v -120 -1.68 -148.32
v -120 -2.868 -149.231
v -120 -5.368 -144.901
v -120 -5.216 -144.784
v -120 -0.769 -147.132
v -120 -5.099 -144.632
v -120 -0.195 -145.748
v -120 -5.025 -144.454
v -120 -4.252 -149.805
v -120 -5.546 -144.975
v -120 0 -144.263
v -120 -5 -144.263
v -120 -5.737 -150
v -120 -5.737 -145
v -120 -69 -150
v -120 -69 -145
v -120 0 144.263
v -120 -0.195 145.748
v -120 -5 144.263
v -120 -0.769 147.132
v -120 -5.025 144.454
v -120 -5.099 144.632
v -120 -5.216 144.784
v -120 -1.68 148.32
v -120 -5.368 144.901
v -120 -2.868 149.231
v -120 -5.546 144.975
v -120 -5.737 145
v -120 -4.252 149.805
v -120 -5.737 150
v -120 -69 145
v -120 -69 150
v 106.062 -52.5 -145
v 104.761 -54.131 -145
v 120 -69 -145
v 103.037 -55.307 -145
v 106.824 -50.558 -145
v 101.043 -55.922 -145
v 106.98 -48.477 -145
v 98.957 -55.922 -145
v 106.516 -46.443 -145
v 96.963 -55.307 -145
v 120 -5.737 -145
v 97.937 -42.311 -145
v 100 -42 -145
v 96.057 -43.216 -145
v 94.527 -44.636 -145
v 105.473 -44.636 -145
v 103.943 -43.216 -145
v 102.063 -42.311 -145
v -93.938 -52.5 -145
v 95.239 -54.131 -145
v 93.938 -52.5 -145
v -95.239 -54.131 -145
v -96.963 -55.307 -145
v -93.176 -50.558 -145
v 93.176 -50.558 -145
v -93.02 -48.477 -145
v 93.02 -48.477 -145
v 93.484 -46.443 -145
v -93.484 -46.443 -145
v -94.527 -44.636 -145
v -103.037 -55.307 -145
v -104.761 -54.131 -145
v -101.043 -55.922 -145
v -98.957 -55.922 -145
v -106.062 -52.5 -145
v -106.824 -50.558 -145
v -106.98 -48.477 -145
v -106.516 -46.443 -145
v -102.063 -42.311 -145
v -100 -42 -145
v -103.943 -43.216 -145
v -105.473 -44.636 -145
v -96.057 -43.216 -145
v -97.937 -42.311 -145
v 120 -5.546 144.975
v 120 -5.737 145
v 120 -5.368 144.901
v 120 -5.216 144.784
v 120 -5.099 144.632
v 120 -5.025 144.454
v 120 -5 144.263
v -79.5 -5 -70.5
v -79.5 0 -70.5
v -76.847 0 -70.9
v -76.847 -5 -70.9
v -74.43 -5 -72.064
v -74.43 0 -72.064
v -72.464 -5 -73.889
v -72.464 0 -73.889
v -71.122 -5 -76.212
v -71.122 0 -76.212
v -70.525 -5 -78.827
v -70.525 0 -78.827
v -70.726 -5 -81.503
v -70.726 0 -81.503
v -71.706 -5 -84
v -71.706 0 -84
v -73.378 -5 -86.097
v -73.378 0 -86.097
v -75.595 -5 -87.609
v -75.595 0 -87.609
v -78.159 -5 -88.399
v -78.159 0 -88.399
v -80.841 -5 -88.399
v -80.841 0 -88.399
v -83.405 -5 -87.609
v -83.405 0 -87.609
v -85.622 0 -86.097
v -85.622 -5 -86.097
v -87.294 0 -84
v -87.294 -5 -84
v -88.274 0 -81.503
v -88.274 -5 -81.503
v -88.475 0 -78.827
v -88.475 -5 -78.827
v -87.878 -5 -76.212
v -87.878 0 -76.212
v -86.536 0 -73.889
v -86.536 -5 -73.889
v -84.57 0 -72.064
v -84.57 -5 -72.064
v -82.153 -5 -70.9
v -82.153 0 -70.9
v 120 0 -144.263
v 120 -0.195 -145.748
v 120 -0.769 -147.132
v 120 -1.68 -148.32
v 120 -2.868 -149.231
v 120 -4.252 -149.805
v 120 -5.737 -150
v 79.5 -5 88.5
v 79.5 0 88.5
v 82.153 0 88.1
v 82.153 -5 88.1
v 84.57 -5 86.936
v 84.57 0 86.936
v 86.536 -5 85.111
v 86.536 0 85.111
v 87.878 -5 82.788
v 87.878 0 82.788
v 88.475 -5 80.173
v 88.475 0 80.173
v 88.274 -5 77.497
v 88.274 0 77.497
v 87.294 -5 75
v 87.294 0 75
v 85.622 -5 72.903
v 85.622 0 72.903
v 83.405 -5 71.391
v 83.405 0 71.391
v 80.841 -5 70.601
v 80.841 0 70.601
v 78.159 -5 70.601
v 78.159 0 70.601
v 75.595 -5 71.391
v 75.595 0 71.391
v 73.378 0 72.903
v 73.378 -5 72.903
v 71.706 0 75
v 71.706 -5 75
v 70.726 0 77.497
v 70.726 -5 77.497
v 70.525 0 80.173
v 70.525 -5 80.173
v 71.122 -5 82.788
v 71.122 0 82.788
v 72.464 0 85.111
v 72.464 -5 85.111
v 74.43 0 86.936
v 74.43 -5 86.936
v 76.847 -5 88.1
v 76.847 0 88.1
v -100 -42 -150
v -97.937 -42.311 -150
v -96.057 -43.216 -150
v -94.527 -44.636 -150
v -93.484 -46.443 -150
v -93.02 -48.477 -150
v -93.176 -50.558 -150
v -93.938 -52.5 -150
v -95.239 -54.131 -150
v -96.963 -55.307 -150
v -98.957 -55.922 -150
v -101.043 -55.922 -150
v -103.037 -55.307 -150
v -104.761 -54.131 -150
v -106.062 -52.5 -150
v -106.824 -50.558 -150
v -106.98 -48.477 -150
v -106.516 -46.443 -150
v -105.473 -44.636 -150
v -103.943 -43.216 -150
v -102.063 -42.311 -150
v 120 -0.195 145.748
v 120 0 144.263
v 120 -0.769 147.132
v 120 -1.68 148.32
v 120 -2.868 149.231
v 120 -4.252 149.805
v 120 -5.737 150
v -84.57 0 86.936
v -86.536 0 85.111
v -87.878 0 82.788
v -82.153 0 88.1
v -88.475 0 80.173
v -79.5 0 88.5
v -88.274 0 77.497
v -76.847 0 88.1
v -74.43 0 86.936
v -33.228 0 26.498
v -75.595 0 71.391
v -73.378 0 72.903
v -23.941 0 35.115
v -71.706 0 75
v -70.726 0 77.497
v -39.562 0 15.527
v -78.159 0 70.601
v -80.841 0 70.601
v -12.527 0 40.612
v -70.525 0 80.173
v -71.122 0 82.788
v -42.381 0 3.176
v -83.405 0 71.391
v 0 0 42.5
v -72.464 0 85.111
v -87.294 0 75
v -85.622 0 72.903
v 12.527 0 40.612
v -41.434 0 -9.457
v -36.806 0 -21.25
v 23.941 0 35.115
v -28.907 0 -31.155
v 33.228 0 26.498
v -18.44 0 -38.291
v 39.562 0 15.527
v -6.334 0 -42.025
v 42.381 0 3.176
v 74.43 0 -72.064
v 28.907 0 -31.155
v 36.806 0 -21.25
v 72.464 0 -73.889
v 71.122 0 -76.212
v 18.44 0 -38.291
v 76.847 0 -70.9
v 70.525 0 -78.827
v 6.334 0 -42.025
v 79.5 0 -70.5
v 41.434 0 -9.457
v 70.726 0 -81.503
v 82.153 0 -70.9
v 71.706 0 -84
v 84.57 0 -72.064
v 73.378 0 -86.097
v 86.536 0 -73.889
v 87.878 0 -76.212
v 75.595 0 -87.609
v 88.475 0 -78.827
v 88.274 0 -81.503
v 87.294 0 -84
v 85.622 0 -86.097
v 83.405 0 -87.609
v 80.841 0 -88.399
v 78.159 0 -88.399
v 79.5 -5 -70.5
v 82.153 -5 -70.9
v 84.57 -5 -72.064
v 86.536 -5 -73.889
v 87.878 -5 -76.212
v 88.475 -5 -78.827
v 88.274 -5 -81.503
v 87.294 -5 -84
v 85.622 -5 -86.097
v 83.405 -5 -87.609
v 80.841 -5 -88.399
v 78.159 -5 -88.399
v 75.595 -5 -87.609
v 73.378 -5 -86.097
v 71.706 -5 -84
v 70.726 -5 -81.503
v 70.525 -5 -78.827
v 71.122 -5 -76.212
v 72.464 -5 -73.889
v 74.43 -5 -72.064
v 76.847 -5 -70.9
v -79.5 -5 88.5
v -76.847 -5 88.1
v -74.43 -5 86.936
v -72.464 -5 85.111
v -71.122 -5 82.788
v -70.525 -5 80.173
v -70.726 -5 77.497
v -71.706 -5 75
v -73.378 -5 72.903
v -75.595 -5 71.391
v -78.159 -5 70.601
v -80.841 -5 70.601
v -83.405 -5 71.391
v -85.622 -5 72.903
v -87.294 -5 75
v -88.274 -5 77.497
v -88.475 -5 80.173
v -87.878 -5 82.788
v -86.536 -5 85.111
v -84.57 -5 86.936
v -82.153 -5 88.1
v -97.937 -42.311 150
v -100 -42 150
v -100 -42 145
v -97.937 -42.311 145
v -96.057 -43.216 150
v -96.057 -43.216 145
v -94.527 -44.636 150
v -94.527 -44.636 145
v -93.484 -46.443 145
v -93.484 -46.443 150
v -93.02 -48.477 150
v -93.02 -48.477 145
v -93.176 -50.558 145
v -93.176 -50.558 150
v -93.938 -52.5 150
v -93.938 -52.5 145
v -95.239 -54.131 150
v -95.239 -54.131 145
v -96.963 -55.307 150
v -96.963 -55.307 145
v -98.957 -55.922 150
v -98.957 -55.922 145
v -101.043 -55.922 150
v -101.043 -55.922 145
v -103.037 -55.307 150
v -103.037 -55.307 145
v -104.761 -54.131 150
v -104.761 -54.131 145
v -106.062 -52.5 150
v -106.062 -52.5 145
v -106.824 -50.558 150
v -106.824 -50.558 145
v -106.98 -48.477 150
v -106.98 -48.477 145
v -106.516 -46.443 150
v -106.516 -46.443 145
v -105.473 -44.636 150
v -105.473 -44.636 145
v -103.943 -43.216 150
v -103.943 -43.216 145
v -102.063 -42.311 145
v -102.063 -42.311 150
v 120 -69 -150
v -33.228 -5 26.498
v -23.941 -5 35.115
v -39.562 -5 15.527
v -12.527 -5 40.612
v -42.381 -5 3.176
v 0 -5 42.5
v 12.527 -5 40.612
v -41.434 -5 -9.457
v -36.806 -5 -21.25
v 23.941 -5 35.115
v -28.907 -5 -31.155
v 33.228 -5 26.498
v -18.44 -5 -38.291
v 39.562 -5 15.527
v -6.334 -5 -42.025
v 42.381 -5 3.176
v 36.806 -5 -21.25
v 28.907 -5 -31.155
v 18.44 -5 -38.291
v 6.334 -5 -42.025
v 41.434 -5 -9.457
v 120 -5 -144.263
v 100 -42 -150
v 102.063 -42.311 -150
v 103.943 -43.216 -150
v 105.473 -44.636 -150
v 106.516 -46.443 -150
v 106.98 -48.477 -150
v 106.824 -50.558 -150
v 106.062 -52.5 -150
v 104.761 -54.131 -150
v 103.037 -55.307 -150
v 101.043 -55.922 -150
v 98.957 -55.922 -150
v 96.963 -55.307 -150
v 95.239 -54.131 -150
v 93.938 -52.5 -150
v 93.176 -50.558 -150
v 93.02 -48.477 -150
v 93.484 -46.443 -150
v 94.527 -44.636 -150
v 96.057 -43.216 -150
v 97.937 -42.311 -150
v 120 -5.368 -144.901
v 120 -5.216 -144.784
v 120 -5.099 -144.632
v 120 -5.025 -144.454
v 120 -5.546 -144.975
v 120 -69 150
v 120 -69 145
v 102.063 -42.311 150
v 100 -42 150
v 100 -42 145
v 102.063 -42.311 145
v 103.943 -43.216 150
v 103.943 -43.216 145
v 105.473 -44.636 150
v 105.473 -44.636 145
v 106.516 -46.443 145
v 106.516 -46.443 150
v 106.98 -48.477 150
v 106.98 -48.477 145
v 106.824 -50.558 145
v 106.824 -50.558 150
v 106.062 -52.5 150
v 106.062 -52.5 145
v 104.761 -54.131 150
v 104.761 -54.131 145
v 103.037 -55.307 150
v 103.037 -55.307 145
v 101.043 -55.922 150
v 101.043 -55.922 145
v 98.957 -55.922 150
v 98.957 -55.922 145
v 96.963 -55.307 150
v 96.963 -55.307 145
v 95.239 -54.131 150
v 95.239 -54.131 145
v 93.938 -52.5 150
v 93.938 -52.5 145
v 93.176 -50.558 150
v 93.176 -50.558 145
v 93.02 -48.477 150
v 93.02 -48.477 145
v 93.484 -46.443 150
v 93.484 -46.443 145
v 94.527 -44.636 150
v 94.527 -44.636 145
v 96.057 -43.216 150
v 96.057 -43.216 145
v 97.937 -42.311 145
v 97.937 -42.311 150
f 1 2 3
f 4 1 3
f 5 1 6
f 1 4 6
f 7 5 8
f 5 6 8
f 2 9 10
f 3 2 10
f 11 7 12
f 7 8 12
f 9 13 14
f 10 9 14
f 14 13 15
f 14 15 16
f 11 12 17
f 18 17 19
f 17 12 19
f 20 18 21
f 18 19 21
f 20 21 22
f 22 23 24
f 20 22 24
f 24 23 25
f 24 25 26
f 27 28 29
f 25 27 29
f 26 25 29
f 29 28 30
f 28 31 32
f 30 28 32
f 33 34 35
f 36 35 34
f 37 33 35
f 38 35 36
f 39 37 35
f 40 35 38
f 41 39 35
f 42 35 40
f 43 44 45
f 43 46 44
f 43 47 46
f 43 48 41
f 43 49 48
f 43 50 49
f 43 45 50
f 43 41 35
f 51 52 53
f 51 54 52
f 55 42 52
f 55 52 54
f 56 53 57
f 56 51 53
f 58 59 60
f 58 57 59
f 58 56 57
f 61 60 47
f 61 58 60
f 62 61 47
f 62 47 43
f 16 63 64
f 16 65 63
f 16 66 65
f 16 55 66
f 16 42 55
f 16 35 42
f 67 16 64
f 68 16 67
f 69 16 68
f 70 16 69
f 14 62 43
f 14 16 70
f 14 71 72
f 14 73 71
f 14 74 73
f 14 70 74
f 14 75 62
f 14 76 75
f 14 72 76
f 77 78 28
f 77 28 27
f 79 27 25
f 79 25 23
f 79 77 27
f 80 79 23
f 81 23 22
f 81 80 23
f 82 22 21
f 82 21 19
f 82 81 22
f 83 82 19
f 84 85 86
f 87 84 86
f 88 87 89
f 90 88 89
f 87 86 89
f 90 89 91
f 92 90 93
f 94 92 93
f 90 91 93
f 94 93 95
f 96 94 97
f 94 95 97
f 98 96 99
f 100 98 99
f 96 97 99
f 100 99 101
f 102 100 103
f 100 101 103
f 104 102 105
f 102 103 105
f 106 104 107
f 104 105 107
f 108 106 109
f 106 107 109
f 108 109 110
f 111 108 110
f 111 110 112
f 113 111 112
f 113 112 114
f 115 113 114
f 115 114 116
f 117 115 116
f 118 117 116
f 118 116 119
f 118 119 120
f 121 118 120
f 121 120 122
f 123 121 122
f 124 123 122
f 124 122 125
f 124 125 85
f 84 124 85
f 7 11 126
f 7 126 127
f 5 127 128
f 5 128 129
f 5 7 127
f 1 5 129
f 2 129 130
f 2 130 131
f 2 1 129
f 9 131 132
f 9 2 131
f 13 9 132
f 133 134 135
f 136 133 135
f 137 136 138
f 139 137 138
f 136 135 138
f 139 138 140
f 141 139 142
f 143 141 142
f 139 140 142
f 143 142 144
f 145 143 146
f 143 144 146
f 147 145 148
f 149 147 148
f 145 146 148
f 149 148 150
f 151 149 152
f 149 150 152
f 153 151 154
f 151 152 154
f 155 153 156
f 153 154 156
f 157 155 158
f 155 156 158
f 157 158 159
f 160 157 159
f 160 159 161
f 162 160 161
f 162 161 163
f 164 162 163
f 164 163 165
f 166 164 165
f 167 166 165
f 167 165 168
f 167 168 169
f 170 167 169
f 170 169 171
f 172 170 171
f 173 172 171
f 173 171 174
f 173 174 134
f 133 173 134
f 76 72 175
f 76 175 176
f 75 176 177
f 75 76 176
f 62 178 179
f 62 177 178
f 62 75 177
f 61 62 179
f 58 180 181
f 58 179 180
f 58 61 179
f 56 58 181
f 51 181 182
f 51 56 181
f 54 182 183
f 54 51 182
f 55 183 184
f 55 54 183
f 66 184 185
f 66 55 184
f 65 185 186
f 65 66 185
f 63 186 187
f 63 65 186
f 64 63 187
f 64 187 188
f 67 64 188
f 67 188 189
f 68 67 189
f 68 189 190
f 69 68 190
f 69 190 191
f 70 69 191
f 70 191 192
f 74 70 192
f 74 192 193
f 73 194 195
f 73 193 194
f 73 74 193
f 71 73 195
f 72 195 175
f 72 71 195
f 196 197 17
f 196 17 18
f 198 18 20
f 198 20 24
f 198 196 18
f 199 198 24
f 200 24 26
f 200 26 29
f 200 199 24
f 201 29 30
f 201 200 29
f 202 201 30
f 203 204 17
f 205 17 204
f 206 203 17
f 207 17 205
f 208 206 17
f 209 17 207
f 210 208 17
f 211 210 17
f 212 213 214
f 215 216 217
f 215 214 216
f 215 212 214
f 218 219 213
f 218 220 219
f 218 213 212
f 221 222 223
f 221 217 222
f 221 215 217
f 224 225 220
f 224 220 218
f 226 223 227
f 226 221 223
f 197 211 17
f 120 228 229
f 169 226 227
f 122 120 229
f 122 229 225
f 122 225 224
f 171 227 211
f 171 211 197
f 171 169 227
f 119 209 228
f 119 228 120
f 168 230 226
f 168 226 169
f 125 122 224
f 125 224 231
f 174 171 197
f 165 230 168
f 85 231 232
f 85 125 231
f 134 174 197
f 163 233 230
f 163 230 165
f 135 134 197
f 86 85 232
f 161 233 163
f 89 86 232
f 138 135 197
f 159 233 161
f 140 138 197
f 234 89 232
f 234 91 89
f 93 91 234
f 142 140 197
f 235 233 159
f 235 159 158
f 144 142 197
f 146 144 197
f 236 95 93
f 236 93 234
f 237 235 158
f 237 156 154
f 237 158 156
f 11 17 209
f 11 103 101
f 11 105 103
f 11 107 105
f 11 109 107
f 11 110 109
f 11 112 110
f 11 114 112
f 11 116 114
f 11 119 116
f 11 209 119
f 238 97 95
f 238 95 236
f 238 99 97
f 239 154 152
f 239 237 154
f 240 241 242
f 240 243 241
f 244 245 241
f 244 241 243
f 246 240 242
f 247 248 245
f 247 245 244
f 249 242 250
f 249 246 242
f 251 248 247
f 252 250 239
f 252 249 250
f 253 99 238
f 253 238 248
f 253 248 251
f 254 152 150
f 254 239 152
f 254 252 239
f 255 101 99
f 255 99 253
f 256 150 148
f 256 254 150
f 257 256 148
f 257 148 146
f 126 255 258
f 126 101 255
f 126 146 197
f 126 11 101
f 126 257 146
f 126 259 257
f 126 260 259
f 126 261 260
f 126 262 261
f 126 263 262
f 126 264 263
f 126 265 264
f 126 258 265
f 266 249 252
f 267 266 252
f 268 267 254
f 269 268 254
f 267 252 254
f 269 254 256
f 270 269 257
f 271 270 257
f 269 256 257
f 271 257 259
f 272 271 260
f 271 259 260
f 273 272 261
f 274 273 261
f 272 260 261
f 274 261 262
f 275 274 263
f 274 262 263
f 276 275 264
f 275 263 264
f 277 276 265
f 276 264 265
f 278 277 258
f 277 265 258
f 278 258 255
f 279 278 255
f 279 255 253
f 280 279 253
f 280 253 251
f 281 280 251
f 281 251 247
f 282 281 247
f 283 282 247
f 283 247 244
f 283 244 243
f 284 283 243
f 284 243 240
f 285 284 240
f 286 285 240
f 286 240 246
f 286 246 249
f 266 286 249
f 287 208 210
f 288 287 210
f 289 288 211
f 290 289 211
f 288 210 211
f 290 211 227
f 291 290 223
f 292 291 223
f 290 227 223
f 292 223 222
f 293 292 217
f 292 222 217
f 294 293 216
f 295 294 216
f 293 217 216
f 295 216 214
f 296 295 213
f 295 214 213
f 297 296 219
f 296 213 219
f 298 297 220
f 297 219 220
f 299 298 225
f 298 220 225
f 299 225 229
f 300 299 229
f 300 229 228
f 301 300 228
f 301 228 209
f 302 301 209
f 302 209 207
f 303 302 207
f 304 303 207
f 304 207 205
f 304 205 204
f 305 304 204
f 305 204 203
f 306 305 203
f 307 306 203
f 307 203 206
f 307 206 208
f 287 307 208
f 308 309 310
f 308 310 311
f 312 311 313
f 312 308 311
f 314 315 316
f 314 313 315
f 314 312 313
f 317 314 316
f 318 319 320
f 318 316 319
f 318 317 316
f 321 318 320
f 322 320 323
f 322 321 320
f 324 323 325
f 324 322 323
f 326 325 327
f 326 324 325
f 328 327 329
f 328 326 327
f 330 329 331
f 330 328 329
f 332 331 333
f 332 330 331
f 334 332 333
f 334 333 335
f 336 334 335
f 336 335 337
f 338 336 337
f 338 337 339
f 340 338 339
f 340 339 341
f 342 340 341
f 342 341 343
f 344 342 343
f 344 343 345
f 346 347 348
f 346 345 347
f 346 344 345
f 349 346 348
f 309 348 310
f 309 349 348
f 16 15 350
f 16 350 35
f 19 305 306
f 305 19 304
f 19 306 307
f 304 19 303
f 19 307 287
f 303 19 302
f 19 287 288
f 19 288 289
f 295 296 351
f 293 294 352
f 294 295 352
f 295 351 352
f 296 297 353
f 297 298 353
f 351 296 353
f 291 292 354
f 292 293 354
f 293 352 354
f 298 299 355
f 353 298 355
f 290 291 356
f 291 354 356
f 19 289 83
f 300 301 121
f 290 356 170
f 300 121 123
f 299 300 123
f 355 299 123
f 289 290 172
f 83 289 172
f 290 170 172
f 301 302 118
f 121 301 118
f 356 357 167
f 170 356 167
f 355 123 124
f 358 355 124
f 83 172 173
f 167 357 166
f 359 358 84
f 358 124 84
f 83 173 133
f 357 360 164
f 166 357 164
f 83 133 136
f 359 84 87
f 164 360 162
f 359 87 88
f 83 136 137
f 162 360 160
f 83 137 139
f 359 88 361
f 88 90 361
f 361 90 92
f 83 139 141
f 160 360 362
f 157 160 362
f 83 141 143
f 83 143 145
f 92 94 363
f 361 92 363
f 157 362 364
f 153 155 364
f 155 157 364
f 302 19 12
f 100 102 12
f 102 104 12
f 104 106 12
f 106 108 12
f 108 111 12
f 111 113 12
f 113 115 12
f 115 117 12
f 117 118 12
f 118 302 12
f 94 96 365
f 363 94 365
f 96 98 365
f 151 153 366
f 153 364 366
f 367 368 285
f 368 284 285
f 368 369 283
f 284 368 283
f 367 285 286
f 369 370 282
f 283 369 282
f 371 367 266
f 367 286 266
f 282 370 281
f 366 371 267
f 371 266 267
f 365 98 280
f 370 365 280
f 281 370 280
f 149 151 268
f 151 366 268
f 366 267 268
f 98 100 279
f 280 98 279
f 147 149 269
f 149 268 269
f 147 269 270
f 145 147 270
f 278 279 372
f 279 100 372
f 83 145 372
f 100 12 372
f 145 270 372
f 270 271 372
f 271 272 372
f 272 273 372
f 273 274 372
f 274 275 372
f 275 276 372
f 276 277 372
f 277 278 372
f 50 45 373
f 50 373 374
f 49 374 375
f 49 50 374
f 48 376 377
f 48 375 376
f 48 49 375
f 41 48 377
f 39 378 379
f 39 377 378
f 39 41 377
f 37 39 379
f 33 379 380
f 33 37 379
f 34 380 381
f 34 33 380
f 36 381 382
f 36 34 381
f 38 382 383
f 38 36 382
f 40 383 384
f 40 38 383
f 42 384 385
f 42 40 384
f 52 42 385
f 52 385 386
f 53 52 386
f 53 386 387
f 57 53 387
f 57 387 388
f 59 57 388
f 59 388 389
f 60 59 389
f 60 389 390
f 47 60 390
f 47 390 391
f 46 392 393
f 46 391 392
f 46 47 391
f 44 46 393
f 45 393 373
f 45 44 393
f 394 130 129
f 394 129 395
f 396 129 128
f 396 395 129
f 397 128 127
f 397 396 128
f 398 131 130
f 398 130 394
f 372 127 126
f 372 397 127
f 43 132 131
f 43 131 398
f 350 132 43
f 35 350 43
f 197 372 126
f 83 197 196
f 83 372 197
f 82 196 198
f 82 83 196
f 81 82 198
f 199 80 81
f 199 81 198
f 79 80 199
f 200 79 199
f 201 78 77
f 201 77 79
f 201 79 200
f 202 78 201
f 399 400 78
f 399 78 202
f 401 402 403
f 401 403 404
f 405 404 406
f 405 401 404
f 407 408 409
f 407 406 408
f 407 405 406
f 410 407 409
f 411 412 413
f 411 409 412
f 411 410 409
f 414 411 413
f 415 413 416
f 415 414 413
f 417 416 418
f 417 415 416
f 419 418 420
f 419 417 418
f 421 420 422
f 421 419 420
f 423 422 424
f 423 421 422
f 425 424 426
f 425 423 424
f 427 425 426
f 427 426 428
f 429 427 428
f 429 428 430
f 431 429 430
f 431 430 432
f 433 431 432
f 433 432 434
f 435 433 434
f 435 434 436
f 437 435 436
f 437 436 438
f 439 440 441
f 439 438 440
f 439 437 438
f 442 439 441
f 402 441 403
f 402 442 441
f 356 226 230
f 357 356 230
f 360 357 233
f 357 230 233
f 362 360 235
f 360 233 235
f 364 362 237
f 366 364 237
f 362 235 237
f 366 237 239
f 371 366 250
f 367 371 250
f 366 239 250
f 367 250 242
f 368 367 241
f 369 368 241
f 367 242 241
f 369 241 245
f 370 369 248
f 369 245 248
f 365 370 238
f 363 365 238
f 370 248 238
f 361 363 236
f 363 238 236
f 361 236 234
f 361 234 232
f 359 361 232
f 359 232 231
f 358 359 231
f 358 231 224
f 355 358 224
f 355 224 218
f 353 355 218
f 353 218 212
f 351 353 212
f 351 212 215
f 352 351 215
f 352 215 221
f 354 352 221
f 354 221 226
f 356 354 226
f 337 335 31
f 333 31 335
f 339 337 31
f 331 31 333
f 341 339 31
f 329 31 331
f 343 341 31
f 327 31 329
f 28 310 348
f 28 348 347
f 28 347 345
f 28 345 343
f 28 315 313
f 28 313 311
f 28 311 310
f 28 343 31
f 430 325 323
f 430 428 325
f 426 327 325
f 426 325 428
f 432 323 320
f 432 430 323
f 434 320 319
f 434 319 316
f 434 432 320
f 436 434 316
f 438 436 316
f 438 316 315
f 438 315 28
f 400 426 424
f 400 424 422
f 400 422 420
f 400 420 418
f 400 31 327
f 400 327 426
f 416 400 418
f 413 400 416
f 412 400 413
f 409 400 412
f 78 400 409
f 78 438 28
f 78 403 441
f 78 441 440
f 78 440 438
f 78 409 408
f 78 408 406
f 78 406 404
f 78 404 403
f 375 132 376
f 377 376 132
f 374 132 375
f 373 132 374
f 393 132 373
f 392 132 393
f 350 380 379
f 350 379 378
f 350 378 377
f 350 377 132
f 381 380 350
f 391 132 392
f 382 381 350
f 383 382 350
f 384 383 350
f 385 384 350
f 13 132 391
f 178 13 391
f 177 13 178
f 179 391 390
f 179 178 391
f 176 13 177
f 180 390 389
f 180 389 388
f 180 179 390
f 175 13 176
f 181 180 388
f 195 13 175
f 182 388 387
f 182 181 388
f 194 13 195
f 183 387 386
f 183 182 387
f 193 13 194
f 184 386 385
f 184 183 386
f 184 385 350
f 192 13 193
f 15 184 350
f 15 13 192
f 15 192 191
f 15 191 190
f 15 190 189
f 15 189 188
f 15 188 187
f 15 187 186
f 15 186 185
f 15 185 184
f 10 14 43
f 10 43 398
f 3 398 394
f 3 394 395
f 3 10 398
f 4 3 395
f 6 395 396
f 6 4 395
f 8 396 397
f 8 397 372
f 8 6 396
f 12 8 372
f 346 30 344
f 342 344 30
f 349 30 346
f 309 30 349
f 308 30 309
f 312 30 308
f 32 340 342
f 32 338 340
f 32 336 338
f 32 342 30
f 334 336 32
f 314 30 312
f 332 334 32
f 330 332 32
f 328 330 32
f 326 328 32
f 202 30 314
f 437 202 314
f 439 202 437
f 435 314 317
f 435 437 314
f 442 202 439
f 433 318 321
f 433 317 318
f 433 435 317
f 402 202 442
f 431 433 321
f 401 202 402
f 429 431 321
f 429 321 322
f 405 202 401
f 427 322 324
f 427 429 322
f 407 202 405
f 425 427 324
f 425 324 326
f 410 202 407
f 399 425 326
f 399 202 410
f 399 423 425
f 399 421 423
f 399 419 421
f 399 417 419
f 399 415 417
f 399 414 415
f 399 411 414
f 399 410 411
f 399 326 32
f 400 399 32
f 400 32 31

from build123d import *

# Parameters (mm, degrees)
SKETCH1_W                      = 240
SKETCH1_H                      = 300
BASE_FLANGE1_DEPTH             = 5
EDGE_FLANGE1_STRIP_W           = 21.4732
EDGE_FLANGE1_STRIP_H           = 5
EDGE_FLANGE1_STRIP_CUT_DEPTH   = 240
EDGE_FLANGE1_STRIP_2_W         = 21.4732
EDGE_FLANGE1_STRIP_2_H         = 5
EDGE_FLANGE1_STRIP_CUT_2_DEPTH = 240
EDGE_FLANGE1_DEPTH             = 240
EDGE_FLANGE1_BEND_DEPTH        = 240
CUT_EXTRUDE1_DEPTH             = 331.395217883
CUT_EXTRUDE1_DEPTH_BACK        = 331.395217883
SKETCH12_R                     = 7
SKETCH13_R                     = 42.5
SKETCH13_R_2                   = 9
CUT_EXTRUDE3_DEPTH             = 10


# Sheet-metal steps are written as plain solids
with BuildPart() as part:
    # Sketch1 → Base-Flange1 (new body)
    with BuildSketch(Plane(origin=(0, 0, 0), x_dir=(1, 0, 0), z_dir=(0, 1, 0))):
        Rectangle(SKETCH1_W, SKETCH1_H)
    extrude(amount=-BASE_FLANGE1_DEPTH)

    # Edge-Flange1 strip (across the edge) → Edge-Flange1 strip cut (cut)
    with BuildSketch(Plane(origin=(-120, -5, -150), x_dir=(0, 0, 1), z_dir=(1, 0, 0))):
        with Locations((-5, -2.5)):
            Rectangle(EDGE_FLANGE1_STRIP_W, EDGE_FLANGE1_STRIP_H)
    extrude(amount=EDGE_FLANGE1_STRIP_CUT_DEPTH, mode=Mode.SUBTRACT)

    # Edge-Flange1 strip 2 (across the edge) → Edge-Flange1 strip cut 2 (cut)
    with BuildSketch(Plane(origin=(120, -5, 150), x_dir=(0, 0, -1), z_dir=(-1, 0, 0))):
        with Locations((-5, -2.5)):
            Rectangle(EDGE_FLANGE1_STRIP_2_W, EDGE_FLANGE1_STRIP_2_H)
    extrude(amount=EDGE_FLANGE1_STRIP_CUT_2_DEPTH, mode=Mode.SUBTRACT)

    # Edge-Flange1 section (across the edge) → Edge-Flange1 (add)
    with BuildSketch(Plane(origin=(-120, -5, -150), x_dir=(0, 0, 1), z_dir=(1, 0, 0))):
        with BuildLine():
            Line((0, 0.7366), (0, 64))
            Line((0, 64), (5, 64))
            Line((5, 64), (5, 0.7366))
            ThreePointArc((5, 0.7366), (5.215745145, 0.215745145), (5.7366, 0))
            Line((5.7366, 0), (5.7366, -5))
            ThreePointArc((5.7366, -5), (1.680211239, -3.319788761), (0, 0.7366))
        make_face()
    extrude(amount=EDGE_FLANGE1_DEPTH)

    # Edge-Flange1 section 2 (across the edge) → Edge-Flange1 bend (add)
    with BuildSketch(Plane(origin=(120, -5, 150), x_dir=(0, 0, -1), z_dir=(-1, 0, 0))):
        with BuildLine():
            Line((0, 0.7366), (0, 64))
            Line((0, 64), (5, 64))
            Line((5, 64), (5, 0.7366))
            ThreePointArc((5, 0.7366), (5.215745145, 0.215745145), (5.7366, 0))
            Line((5.7366, 0), (5.7366, -5))
            ThreePointArc((5.7366, -5), (1.680211239, -3.319788761), (0, 0.7366))
        make_face()
    extrude(amount=EDGE_FLANGE1_BEND_DEPTH)

    # Sketch12 → Cut-Extrude1 (cut, two sides: drawn at the far end of the back side and taken through both)
    with BuildSketch(Plane(origin=(0, 0, -150), x_dir=(-1, 0, 0), z_dir=(0, 0, -1)).offset(-CUT_EXTRUDE1_DEPTH_BACK)):
        with Locations(Location((100, -49, 0), (0, 0, 90))):
            Circle(SKETCH12_R)
        with Locations(Location((-100, -49, 0), (0, 0, 90))):
            Circle(SKETCH12_R)
    extrude(amount=CUT_EXTRUDE1_DEPTH + CUT_EXTRUDE1_DEPTH_BACK, mode=Mode.SUBTRACT)

    # Sketch13 → Cut-Extrude3 (cut)
    with BuildSketch(Plane(origin=(0, 0, 0), x_dir=(1, 0, 0), z_dir=(0, 1, 0))):
        with Locations(Location((0, 0, 0), (0, 0, 270))):
            Circle(SKETCH13_R)
        with Locations(Location((79.5, 79.5, 0), (0, 0, 270))):
            Circle(SKETCH13_R_2)
        with Locations(Location((-79.5, 79.5, 0), (0, 0, 270))):
            Circle(SKETCH13_R_2)
        with Locations(Location((-79.5, -79.5, 0), (0, 0, 270))):
            Circle(SKETCH13_R_2)
        with Locations(Location((79.5, -79.5, 0), (0, 0, 270))):
            Circle(SKETCH13_R_2)
    extrude(amount=-CUT_EXTRUDE3_DEPTH, mode=Mode.SUBTRACT)


solid = part.part
